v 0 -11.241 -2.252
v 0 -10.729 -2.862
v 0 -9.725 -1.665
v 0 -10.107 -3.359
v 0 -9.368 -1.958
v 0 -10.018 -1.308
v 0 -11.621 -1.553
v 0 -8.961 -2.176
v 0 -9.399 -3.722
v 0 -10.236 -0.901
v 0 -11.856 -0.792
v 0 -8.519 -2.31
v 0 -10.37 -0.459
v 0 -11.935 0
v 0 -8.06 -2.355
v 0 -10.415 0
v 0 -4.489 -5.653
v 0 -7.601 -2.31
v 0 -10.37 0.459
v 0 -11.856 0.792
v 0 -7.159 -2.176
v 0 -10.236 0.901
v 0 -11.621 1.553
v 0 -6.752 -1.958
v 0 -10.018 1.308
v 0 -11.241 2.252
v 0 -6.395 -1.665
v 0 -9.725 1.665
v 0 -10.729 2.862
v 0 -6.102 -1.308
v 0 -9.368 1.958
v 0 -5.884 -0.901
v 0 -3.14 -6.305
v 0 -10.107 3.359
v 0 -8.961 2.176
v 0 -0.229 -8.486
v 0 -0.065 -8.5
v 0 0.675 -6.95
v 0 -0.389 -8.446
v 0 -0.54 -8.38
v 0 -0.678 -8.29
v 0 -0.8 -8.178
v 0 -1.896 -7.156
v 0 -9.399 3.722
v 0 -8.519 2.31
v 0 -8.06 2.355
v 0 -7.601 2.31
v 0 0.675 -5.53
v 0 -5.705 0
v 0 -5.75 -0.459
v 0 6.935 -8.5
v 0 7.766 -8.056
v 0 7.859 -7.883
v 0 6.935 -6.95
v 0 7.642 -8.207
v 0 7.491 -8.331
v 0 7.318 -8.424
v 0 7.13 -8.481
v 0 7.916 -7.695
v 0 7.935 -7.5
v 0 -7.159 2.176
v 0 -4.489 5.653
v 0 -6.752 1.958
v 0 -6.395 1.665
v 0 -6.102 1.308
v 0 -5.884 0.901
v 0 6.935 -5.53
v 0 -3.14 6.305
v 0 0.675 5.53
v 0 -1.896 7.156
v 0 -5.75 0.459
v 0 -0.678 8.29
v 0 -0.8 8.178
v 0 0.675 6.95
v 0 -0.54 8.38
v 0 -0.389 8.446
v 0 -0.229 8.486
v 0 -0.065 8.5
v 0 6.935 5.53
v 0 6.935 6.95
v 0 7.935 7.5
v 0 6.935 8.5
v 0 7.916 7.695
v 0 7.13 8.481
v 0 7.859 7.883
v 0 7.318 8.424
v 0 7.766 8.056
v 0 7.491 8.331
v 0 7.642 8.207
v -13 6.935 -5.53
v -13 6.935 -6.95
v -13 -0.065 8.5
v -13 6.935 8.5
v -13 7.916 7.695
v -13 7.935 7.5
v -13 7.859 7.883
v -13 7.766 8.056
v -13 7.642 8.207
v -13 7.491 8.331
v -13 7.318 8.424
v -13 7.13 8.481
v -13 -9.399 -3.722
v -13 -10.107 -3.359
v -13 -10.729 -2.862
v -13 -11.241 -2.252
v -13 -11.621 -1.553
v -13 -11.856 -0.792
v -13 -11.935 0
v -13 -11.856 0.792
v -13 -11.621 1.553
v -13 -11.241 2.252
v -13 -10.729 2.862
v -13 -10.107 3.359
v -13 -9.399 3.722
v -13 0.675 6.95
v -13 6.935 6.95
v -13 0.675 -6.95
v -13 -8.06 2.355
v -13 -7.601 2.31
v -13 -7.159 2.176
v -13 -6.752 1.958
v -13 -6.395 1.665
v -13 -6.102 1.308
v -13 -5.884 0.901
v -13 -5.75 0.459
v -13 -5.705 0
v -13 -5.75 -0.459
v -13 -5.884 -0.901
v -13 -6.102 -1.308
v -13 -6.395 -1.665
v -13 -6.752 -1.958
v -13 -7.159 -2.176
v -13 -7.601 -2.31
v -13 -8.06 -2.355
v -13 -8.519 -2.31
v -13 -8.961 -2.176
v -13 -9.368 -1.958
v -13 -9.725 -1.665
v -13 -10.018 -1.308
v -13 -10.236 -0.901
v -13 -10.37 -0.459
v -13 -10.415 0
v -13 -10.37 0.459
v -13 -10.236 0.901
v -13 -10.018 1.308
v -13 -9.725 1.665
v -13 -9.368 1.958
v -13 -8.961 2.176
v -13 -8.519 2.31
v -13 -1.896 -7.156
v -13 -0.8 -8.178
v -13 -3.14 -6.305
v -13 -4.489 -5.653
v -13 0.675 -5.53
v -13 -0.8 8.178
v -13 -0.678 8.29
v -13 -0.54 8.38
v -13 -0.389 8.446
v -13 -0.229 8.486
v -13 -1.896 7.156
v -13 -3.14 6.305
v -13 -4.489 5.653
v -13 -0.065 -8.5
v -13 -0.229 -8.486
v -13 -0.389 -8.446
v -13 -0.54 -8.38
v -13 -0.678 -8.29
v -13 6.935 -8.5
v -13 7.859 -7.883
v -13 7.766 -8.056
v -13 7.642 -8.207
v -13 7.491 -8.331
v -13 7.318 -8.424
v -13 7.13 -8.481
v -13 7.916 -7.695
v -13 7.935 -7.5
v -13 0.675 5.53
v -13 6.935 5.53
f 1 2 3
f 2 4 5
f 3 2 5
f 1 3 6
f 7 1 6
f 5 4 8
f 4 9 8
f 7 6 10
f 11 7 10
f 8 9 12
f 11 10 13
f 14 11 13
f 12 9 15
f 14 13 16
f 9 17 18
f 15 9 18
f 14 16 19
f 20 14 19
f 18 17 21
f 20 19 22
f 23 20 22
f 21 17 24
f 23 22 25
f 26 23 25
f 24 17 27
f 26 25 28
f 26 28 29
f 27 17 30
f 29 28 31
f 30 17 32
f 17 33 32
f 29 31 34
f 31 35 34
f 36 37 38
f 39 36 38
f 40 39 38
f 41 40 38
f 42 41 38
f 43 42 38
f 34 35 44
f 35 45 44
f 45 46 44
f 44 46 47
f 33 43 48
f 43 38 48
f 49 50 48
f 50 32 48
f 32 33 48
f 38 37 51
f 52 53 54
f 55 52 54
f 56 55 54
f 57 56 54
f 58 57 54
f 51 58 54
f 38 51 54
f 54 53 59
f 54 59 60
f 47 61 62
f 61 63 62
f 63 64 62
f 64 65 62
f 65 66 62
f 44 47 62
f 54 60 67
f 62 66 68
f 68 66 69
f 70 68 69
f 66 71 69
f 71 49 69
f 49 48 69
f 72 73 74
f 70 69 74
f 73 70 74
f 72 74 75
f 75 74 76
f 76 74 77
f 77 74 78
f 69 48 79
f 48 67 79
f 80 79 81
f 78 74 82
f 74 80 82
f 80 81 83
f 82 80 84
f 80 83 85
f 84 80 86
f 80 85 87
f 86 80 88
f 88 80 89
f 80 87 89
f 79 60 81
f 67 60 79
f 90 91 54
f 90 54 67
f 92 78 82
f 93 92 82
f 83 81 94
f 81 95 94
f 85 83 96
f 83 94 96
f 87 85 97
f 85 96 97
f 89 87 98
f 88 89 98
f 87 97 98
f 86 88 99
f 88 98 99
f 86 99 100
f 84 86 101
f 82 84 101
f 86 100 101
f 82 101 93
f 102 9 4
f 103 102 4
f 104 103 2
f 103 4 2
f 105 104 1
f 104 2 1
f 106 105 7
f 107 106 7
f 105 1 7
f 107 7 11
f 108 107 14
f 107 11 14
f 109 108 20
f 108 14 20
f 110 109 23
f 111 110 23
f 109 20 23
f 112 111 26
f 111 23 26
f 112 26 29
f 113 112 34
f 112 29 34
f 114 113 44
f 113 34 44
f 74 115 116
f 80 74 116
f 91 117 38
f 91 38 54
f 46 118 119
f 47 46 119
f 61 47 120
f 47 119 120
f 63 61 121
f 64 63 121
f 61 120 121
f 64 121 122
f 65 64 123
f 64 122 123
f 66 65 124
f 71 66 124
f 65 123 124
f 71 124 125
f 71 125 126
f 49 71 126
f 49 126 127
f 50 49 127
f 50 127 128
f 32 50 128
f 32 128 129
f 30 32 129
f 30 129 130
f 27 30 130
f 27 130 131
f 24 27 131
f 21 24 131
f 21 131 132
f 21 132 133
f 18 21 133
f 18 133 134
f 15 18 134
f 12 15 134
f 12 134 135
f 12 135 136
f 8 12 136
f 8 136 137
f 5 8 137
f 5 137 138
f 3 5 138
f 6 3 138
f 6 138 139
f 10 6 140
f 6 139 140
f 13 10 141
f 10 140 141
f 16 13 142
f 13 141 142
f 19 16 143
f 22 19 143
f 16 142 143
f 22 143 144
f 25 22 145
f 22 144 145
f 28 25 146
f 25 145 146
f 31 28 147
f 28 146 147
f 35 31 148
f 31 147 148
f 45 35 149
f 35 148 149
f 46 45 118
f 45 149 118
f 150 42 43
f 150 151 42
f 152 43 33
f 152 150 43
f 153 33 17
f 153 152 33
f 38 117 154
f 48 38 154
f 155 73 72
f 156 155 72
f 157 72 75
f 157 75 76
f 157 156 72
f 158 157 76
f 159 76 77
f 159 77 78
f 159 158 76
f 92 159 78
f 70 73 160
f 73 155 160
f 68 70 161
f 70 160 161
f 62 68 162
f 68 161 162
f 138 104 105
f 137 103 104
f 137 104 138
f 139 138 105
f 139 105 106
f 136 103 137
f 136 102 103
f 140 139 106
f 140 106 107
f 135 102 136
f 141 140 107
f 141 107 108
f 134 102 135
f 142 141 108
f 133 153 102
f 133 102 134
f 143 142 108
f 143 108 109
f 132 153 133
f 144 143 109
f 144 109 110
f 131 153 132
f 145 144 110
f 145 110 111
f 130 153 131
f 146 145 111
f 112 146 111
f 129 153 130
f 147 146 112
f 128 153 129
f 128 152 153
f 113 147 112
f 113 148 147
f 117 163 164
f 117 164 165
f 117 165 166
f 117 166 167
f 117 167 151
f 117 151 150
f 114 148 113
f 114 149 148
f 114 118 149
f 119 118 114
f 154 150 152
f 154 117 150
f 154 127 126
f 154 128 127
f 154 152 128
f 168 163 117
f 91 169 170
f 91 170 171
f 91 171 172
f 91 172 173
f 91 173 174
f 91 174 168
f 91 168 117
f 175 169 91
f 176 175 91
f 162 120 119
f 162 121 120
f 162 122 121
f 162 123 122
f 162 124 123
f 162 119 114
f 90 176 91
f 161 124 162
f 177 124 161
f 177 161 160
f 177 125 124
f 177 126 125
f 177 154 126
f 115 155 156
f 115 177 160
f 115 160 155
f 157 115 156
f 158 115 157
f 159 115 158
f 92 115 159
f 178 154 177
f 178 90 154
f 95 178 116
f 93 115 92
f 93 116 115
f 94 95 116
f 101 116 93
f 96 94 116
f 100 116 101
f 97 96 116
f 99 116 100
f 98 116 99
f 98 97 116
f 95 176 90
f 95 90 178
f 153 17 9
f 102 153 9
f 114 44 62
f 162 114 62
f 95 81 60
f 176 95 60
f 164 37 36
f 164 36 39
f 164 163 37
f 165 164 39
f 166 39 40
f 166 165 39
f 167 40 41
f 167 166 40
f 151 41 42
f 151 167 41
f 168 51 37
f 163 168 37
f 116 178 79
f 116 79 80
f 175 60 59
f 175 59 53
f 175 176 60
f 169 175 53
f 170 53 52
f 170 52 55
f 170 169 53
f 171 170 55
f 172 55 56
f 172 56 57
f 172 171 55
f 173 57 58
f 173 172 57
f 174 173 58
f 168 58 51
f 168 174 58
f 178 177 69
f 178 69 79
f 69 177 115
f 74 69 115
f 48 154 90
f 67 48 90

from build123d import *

# Parameters (mm, degrees)
BOSS_EXTRUDE1_DEPTH = 13
FILLET1_R           = 1
FILLET2_R           = 10
SKETCH4_R           = 2.355
SKETCH4_W           = 1.42
SKETCH4_H           = 6.26
CUT_EXTRUDE1_DEPTH  = 18


with BuildPart() as part:
    # Sketch1 → Boss-Extrude1 (new body)
    with BuildSketch(Plane(origin=(0, 0, 0), x_dir=(0, 0, -1), z_dir=(1, 0, 0))):
        with BuildLine():
            Line((-8.5, 7.935), (8.5, 7.935))
            Line((8.5, 7.935), (8.5, -1.065))
            Line((8.5, -1.065), (7, -1.065))
            Line((7, -1.065), (3.722478373, -9.398951763))
            ThreePointArc((3.722478373, -9.398951763), (0, -11.935), (-3.722478373, -9.398951763))
            Line((-3.722478373, -9.398951763), (-7, -1.065))
            Line((-7, -1.065), (-8.5, -1.065))
            Line((-8.5, -1.065), (-8.5, 7.935))
        make_face()
    extrude(amount=-BOSS_EXTRUDE1_DEPTH)

    # Fillet1
    fillet1_edges = [part.edges().sort_by_distance(p)[0] for p in [
        (-6.5, 7.935, 8.5),
        (-6.5, 7.935, -8.5),
        (-6.5, -1.065, -8.5),
        (-6.5, -1.065, 8.5),
    ]]
    fillet(fillet1_edges, radius=FILLET1_R)

    # Fillet2
    fillet2_edges = [part.edges().sort_by_distance(p)[0] for p in [
        (-6.5, -1.065, -7),
        (-6.5, -1.065, 7),
    ]]
    fillet(fillet2_edges, radius=FILLET2_R)

    # Sketch4 → Cut-Extrude1 (cut)
    with BuildSketch(Plane.ZY.offset(13)):
        with Locations((0, -8.06)):
            Circle(SKETCH4_R)
        with Locations((6.24, 3.805)):
            Rectangle(SKETCH4_W, SKETCH4_H)
        with Locations((-6.24, 3.805)):
            Rectangle(SKETCH4_W, SKETCH4_H)
    extrude(amount=-CUT_EXTRUDE1_DEPTH, mode=Mode.SUBTRACT)


solid = part.part
